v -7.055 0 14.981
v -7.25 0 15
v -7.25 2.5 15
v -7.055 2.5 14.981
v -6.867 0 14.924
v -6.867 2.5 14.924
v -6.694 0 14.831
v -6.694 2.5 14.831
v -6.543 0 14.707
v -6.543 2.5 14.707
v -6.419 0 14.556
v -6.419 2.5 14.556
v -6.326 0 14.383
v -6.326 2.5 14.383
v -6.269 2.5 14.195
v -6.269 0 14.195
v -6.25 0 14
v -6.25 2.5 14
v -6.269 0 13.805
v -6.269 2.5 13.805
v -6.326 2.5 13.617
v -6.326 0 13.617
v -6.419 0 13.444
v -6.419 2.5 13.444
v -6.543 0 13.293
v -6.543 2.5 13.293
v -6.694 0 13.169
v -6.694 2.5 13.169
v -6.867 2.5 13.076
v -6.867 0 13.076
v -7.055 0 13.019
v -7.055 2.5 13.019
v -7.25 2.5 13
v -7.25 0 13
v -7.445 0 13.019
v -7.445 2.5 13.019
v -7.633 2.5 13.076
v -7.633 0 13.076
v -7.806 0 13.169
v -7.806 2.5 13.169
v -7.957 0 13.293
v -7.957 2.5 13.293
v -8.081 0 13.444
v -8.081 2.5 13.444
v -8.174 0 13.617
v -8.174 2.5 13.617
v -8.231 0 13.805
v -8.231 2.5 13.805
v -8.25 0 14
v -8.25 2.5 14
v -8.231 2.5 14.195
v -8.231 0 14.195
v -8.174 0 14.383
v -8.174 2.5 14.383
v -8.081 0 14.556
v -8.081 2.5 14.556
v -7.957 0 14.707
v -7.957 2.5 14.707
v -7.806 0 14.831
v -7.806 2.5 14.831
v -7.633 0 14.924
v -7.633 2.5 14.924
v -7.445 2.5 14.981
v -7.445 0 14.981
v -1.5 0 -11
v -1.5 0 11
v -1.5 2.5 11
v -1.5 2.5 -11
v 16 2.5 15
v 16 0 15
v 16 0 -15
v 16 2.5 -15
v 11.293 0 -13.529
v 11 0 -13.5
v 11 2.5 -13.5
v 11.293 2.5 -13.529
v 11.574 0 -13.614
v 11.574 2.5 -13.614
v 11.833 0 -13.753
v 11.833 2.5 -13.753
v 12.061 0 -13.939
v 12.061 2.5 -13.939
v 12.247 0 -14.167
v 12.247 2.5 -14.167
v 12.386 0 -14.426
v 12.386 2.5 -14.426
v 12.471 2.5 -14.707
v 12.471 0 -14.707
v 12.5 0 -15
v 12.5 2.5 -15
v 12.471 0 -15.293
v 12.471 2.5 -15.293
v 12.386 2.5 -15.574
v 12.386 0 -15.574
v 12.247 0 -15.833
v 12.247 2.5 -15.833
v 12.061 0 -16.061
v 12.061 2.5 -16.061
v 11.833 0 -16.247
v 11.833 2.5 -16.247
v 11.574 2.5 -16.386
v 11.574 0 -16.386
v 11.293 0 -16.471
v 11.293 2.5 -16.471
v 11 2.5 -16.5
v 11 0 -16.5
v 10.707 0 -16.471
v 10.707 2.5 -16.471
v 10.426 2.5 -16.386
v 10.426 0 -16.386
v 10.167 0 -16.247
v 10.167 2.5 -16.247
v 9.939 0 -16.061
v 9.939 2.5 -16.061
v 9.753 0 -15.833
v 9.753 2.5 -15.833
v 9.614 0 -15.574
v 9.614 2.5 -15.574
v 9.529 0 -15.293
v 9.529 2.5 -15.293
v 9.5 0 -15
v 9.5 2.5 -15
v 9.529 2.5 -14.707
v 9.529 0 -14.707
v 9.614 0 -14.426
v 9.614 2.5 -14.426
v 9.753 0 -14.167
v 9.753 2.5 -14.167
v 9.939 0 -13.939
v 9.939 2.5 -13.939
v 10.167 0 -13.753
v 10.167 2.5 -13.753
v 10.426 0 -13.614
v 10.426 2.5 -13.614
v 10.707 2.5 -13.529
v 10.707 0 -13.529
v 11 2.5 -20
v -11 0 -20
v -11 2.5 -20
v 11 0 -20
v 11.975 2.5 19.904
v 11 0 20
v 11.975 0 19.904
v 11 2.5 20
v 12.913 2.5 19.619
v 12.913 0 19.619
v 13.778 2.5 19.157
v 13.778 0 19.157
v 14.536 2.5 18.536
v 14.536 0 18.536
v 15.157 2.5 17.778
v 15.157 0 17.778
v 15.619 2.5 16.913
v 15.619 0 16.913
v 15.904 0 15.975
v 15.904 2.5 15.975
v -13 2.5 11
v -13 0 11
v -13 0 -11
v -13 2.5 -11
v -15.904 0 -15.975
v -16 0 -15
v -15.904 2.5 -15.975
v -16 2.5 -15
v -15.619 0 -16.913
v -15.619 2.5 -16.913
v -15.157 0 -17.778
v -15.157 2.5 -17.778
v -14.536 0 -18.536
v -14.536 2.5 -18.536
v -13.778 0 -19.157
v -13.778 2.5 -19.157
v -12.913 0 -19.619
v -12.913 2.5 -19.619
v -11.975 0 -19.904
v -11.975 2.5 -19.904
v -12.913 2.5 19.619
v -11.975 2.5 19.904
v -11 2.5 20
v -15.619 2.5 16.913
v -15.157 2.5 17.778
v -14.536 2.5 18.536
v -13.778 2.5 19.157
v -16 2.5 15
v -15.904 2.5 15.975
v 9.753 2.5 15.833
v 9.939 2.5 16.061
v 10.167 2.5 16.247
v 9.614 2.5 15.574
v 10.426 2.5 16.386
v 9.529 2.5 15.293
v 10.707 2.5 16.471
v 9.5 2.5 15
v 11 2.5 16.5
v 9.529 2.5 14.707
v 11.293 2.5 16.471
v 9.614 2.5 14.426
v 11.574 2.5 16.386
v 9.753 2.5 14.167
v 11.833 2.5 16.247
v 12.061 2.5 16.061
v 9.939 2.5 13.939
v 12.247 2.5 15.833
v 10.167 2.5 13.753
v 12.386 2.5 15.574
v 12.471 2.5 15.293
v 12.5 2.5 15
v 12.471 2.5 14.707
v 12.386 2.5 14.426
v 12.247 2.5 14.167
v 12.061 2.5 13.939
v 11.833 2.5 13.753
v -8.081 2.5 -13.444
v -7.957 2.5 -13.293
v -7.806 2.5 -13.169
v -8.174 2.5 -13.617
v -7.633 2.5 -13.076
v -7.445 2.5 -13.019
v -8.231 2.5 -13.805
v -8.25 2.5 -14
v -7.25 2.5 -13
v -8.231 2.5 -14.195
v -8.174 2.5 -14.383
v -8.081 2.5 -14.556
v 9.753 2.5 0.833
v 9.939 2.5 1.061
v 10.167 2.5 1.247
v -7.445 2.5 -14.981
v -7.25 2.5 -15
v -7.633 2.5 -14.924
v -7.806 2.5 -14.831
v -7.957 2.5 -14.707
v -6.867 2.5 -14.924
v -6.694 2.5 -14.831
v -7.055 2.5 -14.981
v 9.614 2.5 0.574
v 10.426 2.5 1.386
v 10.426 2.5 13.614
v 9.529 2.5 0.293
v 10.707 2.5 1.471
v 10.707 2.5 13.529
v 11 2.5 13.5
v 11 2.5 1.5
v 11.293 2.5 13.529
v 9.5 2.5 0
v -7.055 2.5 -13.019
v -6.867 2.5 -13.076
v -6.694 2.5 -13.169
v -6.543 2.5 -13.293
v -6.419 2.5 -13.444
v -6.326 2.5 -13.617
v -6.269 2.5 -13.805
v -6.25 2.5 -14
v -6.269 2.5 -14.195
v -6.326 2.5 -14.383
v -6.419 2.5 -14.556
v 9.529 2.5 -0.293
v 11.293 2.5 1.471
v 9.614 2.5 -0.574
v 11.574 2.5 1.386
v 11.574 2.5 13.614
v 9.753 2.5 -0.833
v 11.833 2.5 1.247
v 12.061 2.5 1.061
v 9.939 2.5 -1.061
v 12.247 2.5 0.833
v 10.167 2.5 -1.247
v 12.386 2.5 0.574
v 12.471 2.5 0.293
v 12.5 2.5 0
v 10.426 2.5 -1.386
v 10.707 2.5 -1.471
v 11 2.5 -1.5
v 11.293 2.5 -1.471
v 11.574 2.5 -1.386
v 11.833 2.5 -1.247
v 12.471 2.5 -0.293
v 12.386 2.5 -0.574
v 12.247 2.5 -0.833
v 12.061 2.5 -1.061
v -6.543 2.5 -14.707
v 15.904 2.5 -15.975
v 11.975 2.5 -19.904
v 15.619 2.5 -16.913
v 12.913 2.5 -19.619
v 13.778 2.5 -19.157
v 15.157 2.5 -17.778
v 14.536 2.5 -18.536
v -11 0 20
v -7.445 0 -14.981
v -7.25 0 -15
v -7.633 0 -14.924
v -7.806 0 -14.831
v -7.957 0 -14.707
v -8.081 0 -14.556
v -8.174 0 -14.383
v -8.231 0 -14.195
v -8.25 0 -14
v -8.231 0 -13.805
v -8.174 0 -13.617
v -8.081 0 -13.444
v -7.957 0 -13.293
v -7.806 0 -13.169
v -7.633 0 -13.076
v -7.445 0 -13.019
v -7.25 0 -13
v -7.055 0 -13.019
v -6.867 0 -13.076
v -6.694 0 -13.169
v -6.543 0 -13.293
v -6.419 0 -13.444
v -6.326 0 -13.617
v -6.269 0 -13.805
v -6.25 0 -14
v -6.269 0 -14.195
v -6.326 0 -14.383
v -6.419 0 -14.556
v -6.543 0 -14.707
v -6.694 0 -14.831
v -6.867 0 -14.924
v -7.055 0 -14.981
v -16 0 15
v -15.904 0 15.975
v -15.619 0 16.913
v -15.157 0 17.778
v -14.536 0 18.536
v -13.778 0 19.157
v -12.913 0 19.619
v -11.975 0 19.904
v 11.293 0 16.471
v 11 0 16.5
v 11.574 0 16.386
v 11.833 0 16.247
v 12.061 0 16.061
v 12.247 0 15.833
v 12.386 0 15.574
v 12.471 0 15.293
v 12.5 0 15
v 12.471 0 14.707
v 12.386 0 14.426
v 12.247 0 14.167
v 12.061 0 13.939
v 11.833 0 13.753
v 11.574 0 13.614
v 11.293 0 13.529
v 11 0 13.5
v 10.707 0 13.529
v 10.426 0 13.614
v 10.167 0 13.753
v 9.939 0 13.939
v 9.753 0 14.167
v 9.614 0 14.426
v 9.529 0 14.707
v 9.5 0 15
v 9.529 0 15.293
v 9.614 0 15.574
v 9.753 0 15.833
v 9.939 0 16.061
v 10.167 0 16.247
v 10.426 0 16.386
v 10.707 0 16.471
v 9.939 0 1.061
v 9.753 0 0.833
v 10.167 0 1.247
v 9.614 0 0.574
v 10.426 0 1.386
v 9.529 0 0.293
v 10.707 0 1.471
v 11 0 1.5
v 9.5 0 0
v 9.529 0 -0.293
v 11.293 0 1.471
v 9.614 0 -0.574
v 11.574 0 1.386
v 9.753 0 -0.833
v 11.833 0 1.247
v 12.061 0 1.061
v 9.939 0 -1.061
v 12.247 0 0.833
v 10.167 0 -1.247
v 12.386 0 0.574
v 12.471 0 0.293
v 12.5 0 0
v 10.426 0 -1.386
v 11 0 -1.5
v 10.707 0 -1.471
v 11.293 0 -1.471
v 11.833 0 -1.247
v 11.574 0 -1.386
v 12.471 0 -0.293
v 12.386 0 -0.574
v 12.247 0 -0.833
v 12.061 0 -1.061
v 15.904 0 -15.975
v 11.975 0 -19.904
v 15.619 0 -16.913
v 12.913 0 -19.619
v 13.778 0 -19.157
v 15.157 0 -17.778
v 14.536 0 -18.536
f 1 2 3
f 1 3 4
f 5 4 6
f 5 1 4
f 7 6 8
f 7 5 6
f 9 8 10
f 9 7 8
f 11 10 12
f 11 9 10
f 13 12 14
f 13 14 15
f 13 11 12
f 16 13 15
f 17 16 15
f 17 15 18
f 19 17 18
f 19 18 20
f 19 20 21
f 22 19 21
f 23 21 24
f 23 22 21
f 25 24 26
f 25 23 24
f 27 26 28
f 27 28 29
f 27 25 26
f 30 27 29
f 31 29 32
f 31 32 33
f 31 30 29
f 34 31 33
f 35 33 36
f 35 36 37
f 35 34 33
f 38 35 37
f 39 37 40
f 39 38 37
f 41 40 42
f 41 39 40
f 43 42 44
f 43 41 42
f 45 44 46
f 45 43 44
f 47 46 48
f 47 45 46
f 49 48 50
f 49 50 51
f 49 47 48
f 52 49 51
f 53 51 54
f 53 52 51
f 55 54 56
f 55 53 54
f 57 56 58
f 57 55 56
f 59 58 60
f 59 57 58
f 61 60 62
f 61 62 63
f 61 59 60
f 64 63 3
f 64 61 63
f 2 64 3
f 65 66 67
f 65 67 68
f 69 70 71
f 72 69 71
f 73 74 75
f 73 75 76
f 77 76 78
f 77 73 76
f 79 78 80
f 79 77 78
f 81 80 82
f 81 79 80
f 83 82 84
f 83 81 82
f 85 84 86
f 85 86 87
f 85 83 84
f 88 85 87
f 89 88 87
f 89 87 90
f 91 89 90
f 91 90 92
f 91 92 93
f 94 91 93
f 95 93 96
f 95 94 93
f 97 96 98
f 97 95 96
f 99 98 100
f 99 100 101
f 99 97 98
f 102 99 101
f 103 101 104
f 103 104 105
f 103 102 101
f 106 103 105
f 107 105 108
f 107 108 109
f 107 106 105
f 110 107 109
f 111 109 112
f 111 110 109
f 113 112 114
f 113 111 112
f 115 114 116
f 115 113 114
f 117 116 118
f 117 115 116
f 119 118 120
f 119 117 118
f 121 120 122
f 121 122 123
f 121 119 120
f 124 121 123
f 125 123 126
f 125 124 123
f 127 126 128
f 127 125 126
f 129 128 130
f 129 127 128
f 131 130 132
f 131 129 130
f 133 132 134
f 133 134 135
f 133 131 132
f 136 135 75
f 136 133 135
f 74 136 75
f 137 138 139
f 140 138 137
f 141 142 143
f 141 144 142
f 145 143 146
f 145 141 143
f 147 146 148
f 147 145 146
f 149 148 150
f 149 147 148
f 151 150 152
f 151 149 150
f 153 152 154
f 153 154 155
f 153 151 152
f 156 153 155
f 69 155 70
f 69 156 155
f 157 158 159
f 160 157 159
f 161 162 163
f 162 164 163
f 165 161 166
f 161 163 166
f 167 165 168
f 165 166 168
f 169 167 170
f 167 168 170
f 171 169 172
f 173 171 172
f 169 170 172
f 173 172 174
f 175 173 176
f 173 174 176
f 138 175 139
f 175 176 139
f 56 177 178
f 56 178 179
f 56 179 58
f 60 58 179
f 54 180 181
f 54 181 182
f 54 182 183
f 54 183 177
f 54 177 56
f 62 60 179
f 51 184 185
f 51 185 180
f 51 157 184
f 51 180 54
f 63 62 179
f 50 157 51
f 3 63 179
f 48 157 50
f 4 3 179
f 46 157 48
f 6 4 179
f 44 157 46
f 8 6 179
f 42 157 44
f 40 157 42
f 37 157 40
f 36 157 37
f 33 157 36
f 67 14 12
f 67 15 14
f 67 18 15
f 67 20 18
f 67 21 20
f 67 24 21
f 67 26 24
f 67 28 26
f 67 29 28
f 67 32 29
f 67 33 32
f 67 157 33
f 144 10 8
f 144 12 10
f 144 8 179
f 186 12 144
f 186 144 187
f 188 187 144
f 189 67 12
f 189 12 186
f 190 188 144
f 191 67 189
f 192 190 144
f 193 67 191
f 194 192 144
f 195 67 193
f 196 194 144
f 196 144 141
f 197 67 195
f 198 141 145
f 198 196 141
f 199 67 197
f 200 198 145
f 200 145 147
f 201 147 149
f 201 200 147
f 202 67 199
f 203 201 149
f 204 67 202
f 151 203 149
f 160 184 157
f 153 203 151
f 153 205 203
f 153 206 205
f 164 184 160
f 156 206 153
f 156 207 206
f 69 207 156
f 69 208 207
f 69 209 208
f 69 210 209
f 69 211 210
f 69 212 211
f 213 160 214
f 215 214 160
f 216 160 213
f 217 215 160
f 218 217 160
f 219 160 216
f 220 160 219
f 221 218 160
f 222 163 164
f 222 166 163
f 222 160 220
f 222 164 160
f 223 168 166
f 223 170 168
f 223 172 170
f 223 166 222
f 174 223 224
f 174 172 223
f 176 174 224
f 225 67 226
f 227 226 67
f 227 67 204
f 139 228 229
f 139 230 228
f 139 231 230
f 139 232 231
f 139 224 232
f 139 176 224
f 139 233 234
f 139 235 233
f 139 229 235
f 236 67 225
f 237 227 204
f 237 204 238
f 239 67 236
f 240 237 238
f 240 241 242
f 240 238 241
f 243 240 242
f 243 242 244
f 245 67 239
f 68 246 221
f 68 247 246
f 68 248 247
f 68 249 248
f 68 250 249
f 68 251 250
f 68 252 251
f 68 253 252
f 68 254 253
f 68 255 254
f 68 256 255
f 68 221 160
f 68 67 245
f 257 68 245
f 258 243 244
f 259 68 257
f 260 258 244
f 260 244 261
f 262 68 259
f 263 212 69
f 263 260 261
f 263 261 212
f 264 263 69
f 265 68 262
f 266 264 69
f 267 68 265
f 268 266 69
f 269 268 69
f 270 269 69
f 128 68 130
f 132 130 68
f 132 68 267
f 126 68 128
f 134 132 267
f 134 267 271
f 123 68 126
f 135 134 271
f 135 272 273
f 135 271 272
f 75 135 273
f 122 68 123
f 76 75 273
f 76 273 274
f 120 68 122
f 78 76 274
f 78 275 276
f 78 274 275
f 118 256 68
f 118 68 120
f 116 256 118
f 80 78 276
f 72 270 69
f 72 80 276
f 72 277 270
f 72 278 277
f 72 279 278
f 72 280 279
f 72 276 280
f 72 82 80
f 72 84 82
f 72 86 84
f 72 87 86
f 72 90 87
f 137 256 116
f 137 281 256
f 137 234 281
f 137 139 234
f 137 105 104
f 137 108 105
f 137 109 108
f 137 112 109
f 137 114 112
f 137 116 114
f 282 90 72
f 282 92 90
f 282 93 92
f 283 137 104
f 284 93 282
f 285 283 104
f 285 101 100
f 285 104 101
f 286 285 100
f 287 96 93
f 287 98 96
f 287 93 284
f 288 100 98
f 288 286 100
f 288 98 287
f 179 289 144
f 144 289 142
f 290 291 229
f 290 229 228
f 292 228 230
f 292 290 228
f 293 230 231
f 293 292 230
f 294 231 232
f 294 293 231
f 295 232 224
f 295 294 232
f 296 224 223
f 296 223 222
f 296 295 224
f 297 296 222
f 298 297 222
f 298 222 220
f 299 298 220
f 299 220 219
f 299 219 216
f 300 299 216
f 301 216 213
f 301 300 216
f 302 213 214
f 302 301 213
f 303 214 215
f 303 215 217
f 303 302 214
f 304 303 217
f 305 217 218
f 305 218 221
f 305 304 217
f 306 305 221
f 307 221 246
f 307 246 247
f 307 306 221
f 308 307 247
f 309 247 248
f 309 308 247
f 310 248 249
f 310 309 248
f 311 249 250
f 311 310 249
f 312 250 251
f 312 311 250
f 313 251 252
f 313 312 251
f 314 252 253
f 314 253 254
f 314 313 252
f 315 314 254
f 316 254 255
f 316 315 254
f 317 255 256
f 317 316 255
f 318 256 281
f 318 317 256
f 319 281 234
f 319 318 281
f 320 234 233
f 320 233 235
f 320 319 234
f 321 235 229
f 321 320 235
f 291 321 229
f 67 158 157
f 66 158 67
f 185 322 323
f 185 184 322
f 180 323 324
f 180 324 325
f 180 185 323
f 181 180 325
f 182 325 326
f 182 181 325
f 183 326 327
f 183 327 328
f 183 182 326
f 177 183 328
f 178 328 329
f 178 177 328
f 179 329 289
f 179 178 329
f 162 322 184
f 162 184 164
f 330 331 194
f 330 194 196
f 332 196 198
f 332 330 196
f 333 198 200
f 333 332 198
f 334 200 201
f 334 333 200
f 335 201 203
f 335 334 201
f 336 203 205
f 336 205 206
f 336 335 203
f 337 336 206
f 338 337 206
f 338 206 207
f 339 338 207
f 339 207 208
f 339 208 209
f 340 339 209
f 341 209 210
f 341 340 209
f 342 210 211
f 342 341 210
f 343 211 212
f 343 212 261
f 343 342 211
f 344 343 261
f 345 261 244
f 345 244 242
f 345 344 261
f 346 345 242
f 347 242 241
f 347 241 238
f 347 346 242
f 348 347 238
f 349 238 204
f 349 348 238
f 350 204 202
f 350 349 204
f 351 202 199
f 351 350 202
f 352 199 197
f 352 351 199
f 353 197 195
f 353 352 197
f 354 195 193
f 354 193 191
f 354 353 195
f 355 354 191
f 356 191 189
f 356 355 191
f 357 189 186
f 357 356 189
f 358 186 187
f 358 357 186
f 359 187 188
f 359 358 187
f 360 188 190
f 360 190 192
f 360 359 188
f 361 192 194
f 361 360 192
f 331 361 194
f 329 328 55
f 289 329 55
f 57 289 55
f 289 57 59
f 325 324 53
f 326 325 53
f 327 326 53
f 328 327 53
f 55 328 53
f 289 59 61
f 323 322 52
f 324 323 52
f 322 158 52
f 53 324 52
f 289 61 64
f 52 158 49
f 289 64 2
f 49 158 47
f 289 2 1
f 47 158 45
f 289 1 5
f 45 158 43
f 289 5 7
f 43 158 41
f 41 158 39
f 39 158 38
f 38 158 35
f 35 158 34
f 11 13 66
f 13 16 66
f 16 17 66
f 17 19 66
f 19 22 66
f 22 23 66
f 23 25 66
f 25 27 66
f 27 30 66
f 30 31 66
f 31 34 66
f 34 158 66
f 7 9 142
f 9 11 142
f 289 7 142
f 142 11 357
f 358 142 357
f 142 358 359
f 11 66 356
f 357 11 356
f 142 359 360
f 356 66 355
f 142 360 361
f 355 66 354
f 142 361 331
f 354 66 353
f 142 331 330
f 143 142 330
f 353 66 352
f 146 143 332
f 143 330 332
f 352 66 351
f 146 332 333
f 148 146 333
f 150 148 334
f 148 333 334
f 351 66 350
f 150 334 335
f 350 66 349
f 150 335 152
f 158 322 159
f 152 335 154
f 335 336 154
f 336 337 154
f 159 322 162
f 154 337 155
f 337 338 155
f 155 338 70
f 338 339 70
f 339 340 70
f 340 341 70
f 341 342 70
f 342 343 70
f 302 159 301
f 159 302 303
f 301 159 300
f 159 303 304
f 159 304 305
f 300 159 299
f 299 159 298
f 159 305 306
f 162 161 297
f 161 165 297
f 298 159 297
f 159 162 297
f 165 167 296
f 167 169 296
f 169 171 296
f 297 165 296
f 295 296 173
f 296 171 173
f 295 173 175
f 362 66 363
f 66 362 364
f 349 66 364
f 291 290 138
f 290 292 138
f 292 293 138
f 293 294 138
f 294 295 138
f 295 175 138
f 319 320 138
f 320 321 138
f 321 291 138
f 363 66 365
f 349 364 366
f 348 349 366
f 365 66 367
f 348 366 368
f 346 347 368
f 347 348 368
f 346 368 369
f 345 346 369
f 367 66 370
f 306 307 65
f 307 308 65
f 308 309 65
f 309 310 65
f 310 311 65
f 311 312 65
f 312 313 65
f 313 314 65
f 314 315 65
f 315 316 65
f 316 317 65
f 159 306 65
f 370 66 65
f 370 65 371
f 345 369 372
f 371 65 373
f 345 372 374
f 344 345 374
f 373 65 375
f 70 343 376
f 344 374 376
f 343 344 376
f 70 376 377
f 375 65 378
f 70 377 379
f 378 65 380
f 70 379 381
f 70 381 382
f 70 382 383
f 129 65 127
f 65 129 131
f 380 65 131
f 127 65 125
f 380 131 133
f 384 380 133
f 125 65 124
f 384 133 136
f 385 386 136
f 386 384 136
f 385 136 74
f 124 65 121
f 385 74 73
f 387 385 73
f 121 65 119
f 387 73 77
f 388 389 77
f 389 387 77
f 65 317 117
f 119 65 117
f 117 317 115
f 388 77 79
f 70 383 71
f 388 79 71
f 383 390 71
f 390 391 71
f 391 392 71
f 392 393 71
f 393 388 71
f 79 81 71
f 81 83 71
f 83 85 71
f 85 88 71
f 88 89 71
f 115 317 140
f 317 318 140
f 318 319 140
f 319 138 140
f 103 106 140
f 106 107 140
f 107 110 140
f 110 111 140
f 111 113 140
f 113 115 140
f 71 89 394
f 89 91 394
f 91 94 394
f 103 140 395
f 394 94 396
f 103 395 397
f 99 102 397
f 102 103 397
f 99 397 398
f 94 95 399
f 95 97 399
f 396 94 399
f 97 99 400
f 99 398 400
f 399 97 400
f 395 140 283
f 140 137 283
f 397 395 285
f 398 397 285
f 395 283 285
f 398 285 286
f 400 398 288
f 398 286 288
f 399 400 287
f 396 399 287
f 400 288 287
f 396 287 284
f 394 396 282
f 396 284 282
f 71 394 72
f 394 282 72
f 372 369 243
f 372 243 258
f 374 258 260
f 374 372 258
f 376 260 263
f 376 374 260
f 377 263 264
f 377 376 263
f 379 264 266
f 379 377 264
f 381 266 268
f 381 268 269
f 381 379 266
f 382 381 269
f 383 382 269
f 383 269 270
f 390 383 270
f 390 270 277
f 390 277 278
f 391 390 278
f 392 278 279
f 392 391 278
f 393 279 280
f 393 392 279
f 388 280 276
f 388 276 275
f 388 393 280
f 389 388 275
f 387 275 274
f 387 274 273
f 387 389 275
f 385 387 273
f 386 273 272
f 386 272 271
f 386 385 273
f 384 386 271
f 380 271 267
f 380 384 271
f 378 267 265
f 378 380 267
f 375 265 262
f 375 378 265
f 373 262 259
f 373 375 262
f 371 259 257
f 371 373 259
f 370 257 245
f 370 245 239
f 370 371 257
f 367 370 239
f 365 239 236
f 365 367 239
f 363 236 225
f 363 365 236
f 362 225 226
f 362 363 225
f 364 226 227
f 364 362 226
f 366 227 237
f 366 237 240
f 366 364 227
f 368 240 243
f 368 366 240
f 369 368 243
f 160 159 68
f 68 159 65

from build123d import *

# Parameters (mm, degrees)
SKETCH1_W           = 32
SKETCH1_H           = 40
SKETCH1_R           = 1.5
SKETCH1_R_2         = 1
SKETCH1_W_2         = 11.5
SKETCH1_H_2         = 22
BOSS_EXTRUDE1_DEPTH = 2.5
FILLET1_R           = 5


with BuildPart() as part:
    # Sketch1 → Boss-Extrude1 (new body)
    with BuildSketch(Plane(origin=(0, 0, 0), x_dir=(1, 0, 0), z_dir=(0, 1, 0))):
        Rectangle(SKETCH1_W, SKETCH1_H)
        with Locations(Location((11, 15, 0), (0, 0, 270))):
            Circle(SKETCH1_R, mode=Mode.SUBTRACT)
        with Locations(Location((11, 0, 0), (0, 0, 270))):
            Circle(SKETCH1_R, mode=Mode.SUBTRACT)
        with Locations(Location((11, -15, 0), (0, 0, 270))):
            Circle(SKETCH1_R, mode=Mode.SUBTRACT)
        with Locations(Location((-7.25, -14, 0), (0, 0, 270))):
            Circle(SKETCH1_R_2, mode=Mode.SUBTRACT)
        with Locations(Location((-7.25, 14, 0), (0, 0, 90))):
            Circle(SKETCH1_R_2, mode=Mode.SUBTRACT)
        with Locations((-7.25, 0)):
            Rectangle(SKETCH1_W_2, SKETCH1_H_2, mode=Mode.SUBTRACT)
    extrude(amount=BOSS_EXTRUDE1_DEPTH)

    # Fillet1
    fillet1_edges = [part.edges().sort_by_distance(p)[0] for p in [
        (-16, 1.25, -20),
        (16, 1.25, -20),
        (16, 1.25, 20),
        (-16, 1.25, 20),
    ]]
    fillet(fillet1_edges, radius=FILLET1_R)


solid = part.part
